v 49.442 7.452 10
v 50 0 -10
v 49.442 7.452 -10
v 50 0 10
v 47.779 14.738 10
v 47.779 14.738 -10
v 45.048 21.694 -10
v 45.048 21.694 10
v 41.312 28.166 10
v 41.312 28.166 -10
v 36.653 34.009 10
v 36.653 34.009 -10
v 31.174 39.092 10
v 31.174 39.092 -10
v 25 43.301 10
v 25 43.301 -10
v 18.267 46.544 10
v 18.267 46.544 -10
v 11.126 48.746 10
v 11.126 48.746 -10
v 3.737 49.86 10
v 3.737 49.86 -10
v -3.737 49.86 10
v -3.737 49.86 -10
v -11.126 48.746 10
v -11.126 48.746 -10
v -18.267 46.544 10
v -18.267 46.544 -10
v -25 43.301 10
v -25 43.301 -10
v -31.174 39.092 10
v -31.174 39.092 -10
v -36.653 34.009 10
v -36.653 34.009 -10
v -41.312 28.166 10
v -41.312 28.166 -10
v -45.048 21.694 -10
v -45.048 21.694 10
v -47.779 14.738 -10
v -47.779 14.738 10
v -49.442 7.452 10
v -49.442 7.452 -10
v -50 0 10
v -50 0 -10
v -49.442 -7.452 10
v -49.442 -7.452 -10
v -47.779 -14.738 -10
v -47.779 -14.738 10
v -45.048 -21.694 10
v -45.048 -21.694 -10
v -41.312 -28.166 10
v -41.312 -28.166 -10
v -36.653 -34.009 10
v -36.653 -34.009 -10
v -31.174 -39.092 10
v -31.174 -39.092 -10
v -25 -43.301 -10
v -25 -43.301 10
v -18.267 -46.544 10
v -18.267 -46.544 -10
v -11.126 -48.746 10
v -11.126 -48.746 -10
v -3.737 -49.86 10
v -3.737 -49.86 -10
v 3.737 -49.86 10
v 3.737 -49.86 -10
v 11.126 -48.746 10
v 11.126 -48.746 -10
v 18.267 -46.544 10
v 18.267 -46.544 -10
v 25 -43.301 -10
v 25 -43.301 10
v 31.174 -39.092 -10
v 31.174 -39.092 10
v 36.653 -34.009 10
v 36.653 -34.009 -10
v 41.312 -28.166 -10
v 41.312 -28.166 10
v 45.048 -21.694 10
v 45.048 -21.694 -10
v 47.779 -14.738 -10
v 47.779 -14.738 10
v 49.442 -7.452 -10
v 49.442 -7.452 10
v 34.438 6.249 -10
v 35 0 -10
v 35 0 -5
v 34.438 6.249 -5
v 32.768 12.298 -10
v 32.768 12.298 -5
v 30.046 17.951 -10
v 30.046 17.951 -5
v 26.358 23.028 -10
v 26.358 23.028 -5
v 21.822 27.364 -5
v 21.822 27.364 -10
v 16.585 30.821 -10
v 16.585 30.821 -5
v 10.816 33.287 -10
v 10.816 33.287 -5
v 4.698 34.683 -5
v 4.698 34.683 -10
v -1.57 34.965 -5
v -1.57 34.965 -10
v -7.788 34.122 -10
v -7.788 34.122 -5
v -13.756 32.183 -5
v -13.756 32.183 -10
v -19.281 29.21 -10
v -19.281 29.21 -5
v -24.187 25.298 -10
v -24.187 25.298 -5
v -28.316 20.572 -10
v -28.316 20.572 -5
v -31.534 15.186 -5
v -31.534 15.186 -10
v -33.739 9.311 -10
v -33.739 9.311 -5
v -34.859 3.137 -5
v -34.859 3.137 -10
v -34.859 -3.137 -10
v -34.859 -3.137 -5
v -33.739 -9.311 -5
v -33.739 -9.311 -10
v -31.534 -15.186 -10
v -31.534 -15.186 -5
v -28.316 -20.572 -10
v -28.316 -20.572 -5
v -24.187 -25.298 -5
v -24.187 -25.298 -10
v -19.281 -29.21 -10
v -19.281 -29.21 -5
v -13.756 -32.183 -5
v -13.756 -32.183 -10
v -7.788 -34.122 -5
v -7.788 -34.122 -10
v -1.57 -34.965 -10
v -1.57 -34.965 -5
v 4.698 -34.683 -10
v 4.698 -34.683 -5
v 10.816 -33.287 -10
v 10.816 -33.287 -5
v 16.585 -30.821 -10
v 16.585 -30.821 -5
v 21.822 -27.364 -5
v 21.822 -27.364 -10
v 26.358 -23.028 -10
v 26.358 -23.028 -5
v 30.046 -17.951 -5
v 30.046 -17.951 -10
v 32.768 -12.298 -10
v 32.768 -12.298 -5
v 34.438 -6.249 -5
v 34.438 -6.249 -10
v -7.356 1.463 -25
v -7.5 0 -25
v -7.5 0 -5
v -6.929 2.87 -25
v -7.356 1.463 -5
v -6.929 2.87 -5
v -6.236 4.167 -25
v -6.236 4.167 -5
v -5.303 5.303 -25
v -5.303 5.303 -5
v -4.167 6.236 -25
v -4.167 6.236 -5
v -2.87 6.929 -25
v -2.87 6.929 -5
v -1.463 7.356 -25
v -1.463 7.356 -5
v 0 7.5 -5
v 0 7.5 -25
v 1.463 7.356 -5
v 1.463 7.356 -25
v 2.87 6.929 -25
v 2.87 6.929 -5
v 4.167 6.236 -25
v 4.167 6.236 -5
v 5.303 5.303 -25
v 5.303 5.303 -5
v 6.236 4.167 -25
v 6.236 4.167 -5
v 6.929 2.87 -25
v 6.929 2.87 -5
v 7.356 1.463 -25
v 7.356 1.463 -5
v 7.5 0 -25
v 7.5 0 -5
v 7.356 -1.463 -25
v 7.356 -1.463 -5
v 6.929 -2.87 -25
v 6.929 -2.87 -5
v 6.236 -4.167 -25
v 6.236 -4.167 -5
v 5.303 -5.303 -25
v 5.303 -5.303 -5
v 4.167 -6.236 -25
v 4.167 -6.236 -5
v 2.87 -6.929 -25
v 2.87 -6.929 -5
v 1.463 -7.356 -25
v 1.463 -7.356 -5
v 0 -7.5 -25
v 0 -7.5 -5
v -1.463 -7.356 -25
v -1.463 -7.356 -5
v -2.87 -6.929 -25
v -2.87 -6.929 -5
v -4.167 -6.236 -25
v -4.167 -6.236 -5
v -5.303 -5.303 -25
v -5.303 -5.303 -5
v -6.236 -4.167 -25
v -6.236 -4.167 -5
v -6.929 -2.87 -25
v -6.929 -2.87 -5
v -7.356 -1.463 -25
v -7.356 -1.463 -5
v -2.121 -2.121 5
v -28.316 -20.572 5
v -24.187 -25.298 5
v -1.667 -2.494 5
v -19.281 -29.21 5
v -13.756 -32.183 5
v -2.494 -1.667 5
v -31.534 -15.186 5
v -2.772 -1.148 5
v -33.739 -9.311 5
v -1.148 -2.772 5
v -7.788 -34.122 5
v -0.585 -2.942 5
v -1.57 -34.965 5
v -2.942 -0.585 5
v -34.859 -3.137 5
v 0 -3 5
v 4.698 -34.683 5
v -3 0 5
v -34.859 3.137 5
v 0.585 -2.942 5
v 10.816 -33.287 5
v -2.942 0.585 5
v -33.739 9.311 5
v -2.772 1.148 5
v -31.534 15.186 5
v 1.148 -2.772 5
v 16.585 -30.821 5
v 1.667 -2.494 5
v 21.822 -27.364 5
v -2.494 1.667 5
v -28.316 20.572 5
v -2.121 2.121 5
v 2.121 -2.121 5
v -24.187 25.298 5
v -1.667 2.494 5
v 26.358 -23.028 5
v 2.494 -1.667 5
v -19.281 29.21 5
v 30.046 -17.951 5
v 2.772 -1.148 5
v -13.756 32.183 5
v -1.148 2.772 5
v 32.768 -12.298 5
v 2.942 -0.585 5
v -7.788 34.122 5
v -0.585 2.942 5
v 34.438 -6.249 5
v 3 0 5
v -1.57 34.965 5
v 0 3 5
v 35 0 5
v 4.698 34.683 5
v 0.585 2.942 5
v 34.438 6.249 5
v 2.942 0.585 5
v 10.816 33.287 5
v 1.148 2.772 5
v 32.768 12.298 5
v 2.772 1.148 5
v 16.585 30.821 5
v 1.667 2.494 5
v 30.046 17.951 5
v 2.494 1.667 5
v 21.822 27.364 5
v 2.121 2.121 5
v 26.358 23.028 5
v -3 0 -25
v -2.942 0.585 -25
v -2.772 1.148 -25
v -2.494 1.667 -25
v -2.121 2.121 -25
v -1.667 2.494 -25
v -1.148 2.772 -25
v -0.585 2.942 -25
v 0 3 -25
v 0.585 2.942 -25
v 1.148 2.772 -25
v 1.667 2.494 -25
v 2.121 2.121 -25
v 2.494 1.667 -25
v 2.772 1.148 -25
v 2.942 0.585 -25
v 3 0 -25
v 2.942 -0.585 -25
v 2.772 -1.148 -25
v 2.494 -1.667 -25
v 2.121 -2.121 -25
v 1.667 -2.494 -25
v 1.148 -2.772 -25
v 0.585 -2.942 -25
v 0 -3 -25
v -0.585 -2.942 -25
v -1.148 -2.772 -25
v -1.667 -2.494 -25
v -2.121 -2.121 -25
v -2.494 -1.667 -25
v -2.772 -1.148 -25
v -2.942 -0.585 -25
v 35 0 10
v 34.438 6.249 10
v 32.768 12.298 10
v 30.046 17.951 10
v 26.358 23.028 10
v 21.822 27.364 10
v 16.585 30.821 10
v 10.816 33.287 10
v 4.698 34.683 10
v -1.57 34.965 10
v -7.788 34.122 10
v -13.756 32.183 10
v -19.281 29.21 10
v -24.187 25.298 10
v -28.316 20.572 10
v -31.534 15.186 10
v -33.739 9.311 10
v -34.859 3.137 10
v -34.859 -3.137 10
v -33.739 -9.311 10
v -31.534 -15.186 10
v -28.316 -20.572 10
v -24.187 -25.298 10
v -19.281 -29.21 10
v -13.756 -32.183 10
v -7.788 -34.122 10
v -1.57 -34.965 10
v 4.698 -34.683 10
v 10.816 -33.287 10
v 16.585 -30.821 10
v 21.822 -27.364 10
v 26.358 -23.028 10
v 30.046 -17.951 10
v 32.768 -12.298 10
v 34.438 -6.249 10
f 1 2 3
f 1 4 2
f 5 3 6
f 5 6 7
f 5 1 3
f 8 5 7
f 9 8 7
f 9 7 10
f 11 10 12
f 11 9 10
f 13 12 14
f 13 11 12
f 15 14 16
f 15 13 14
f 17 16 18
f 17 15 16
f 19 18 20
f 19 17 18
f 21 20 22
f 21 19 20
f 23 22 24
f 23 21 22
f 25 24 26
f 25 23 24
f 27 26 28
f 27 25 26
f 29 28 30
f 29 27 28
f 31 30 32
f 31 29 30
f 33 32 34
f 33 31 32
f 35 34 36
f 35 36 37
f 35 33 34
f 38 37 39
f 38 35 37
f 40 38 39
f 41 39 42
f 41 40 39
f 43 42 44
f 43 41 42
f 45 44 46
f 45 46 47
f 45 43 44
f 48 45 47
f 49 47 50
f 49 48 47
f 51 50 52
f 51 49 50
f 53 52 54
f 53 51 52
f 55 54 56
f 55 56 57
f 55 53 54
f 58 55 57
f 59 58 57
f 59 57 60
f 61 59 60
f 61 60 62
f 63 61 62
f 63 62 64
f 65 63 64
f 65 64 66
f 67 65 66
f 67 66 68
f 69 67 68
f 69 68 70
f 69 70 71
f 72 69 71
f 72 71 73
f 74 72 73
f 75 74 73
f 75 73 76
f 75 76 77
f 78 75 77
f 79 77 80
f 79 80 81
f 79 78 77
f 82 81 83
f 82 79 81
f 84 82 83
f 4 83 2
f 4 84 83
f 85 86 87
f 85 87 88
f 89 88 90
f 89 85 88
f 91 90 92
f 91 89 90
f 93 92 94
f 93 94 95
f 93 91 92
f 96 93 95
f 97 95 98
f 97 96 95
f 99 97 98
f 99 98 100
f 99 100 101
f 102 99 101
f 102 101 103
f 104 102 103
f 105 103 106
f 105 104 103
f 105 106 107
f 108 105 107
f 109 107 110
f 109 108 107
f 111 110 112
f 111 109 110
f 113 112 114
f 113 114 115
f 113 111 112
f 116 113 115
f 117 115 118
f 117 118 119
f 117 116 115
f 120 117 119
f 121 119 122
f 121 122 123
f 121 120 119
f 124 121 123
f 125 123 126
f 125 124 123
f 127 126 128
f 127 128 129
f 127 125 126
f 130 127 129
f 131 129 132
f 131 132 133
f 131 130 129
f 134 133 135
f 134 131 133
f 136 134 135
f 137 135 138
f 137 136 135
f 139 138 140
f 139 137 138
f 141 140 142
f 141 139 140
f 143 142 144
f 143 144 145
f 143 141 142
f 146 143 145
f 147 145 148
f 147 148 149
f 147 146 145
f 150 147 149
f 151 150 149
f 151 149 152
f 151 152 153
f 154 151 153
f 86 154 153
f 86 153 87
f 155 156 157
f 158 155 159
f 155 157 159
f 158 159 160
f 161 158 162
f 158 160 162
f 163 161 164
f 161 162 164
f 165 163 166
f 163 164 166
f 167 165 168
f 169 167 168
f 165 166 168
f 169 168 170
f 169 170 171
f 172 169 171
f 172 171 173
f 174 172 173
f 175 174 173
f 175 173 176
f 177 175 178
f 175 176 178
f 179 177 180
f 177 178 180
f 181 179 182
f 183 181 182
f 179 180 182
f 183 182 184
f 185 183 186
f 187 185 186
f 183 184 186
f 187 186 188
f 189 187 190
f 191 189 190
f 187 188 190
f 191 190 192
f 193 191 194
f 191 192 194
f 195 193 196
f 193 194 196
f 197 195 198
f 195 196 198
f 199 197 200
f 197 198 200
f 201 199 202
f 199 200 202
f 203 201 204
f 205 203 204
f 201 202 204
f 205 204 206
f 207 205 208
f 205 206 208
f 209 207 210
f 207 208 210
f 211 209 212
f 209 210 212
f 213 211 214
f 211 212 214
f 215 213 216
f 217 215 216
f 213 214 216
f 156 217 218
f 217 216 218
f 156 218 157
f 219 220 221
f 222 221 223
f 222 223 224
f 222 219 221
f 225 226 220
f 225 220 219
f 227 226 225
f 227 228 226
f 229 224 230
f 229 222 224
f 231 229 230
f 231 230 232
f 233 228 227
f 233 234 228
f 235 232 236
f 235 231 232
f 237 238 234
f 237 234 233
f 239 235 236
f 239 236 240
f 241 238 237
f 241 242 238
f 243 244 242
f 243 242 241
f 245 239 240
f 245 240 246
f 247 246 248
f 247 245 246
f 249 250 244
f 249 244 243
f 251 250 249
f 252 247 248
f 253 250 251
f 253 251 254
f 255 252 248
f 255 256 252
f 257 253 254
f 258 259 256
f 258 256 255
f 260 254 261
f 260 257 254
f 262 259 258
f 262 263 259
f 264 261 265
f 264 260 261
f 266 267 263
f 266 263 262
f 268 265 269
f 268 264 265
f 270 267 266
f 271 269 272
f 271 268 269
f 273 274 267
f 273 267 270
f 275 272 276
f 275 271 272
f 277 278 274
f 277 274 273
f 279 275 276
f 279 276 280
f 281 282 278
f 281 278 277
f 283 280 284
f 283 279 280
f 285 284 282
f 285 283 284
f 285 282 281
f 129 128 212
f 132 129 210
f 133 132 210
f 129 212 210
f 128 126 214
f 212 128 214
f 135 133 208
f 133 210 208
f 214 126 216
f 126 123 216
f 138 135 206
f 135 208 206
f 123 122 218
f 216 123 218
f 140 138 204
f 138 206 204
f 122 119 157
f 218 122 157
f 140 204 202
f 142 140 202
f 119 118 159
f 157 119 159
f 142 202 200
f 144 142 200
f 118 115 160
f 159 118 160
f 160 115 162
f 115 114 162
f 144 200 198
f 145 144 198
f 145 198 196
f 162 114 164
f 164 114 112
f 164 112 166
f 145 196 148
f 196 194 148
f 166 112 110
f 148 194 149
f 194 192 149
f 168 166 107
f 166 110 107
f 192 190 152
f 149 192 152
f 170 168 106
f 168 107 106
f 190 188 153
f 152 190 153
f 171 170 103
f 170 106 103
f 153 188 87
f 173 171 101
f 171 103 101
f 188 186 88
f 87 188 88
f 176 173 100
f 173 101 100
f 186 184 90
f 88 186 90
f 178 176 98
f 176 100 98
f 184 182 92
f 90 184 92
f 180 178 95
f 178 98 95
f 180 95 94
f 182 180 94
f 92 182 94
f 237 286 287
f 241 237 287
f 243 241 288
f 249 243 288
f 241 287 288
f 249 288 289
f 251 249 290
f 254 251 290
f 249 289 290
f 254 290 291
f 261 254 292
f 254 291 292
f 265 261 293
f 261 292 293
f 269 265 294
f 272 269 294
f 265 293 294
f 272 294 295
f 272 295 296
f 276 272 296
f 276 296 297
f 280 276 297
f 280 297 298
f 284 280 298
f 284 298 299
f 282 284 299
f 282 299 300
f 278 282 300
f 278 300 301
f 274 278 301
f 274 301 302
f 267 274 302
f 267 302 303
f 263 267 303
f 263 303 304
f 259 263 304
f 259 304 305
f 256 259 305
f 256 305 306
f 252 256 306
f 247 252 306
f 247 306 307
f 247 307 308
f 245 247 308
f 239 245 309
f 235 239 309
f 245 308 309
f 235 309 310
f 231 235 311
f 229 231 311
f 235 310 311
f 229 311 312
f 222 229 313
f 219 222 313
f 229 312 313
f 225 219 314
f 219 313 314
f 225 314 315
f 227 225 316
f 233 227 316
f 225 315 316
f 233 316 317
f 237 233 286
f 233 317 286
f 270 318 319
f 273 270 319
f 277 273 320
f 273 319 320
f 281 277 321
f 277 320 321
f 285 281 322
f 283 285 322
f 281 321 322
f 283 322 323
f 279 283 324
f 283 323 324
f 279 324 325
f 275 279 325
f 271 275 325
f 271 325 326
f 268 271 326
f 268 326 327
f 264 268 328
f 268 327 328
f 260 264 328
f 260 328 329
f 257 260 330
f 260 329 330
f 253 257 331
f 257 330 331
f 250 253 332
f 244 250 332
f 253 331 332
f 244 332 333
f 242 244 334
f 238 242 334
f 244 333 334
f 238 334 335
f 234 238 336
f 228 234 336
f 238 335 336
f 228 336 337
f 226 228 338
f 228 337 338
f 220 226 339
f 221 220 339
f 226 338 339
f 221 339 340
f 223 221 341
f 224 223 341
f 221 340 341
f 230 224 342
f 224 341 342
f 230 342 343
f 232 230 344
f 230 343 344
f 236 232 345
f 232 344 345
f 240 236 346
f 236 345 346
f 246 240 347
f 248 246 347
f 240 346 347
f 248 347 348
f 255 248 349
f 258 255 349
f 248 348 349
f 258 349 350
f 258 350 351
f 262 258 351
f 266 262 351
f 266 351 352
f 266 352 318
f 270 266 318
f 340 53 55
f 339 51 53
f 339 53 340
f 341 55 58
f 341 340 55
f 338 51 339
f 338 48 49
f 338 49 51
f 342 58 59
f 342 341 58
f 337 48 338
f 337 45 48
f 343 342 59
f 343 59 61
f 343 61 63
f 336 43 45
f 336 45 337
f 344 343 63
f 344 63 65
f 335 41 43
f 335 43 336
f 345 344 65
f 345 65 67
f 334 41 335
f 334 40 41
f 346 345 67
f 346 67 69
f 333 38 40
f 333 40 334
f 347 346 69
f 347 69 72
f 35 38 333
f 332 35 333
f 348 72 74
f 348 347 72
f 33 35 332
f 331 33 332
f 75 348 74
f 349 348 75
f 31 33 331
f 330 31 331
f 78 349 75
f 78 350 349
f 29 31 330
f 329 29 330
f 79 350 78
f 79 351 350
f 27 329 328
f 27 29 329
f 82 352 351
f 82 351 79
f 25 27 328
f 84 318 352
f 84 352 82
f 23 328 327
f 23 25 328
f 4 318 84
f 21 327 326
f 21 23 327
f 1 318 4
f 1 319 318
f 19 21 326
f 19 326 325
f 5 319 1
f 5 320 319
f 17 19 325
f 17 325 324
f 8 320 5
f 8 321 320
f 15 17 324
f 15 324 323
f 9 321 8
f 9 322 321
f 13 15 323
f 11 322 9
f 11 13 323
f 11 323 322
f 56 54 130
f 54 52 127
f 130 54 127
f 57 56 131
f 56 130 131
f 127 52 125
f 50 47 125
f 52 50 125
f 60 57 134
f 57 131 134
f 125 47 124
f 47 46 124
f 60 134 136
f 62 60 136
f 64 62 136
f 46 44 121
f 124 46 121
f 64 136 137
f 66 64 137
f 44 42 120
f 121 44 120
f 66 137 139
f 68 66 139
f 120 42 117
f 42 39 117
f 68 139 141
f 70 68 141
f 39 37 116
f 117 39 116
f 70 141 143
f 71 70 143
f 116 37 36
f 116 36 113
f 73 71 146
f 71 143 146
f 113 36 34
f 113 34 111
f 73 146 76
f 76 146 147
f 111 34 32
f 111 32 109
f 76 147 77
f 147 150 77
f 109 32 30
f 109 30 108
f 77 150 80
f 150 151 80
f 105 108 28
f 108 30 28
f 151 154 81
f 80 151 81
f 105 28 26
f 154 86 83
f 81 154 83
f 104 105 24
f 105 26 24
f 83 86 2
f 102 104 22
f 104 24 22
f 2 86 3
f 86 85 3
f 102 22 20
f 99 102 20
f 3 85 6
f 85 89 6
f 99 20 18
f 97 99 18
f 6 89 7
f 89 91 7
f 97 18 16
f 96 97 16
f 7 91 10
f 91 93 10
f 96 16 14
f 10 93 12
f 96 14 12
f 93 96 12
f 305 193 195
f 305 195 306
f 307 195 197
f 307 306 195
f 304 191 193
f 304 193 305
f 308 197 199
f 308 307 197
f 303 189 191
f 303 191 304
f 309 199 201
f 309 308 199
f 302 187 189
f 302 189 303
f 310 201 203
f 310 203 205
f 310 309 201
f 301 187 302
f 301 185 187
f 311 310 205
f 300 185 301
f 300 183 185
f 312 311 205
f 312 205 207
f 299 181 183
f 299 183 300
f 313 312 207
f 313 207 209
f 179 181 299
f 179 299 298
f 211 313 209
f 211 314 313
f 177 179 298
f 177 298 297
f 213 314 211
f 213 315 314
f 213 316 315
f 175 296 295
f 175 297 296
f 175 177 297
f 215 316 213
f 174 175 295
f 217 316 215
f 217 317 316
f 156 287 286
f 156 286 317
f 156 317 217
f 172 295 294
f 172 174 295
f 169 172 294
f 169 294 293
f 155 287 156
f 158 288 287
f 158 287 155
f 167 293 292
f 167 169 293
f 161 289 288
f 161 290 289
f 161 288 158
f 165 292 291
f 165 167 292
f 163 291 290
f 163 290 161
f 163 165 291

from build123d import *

# Parameters (mm, degrees)
SKETCH1_R           = 50
BOSS_EXTRUDE1_DEPTH = 10
SKETCH2_R           = 35
CUT_EXTRUDE1_DEPTH  = 5
SKETCH3_R           = 7.5
BOSS_EXTRUDE2_DEPTH = 20
CUT_EXTRUDE2_REACH  = 37
SKETCH4_R           = 3


with BuildPart() as part:
    # Sketch1 → Boss-Extrude1 (new body, symmetric)
    with BuildSketch(Plane.XY):
        Circle(SKETCH1_R)
    extrude(amount=BOSS_EXTRUDE1_DEPTH, both=True)

    # Sketch2 → Cut-Extrude1 (cut)
    with BuildSketch(Plane.XY.offset(10)):
        Circle(SKETCH2_R)
    cut_extrude1 = extrude(amount=-CUT_EXTRUDE1_DEPTH, mode=Mode.SUBTRACT)

    # Mirror1: Cut-Extrude1 across plane
    add(cut_extrude1.mirror(Plane.XY), mode=Mode.SUBTRACT)

    # Sketch3 → Boss-Extrude2 (add)
    with BuildSketch(Plane(origin=(0, 0, -5), x_dir=(-1, 0, 0), z_dir=(0, 0, -1))):
        Circle(SKETCH3_R)
    extrude(amount=BOSS_EXTRUDE2_DEPTH)

    # Sketch4 → Cut-Extrude2 (cut, up to next)
    with BuildSketch(Plane(origin=(0, 0, -25), x_dir=(-1, 0, 0), z_dir=(0, 0, -1)), mode=Mode.PRIVATE) as cut_extrude2_sk1:
        Circle(SKETCH4_R)
    cut_extrude2_tool1 = extrude(cut_extrude2_sk1.sketch, amount=-CUT_EXTRUDE2_REACH, mode=Mode.PRIVATE) & part.part
    add(cut_extrude2_tool1.solids().sort_by_distance((0, 0, -25))[0], mode=Mode.SUBTRACT)


solid = part.part
